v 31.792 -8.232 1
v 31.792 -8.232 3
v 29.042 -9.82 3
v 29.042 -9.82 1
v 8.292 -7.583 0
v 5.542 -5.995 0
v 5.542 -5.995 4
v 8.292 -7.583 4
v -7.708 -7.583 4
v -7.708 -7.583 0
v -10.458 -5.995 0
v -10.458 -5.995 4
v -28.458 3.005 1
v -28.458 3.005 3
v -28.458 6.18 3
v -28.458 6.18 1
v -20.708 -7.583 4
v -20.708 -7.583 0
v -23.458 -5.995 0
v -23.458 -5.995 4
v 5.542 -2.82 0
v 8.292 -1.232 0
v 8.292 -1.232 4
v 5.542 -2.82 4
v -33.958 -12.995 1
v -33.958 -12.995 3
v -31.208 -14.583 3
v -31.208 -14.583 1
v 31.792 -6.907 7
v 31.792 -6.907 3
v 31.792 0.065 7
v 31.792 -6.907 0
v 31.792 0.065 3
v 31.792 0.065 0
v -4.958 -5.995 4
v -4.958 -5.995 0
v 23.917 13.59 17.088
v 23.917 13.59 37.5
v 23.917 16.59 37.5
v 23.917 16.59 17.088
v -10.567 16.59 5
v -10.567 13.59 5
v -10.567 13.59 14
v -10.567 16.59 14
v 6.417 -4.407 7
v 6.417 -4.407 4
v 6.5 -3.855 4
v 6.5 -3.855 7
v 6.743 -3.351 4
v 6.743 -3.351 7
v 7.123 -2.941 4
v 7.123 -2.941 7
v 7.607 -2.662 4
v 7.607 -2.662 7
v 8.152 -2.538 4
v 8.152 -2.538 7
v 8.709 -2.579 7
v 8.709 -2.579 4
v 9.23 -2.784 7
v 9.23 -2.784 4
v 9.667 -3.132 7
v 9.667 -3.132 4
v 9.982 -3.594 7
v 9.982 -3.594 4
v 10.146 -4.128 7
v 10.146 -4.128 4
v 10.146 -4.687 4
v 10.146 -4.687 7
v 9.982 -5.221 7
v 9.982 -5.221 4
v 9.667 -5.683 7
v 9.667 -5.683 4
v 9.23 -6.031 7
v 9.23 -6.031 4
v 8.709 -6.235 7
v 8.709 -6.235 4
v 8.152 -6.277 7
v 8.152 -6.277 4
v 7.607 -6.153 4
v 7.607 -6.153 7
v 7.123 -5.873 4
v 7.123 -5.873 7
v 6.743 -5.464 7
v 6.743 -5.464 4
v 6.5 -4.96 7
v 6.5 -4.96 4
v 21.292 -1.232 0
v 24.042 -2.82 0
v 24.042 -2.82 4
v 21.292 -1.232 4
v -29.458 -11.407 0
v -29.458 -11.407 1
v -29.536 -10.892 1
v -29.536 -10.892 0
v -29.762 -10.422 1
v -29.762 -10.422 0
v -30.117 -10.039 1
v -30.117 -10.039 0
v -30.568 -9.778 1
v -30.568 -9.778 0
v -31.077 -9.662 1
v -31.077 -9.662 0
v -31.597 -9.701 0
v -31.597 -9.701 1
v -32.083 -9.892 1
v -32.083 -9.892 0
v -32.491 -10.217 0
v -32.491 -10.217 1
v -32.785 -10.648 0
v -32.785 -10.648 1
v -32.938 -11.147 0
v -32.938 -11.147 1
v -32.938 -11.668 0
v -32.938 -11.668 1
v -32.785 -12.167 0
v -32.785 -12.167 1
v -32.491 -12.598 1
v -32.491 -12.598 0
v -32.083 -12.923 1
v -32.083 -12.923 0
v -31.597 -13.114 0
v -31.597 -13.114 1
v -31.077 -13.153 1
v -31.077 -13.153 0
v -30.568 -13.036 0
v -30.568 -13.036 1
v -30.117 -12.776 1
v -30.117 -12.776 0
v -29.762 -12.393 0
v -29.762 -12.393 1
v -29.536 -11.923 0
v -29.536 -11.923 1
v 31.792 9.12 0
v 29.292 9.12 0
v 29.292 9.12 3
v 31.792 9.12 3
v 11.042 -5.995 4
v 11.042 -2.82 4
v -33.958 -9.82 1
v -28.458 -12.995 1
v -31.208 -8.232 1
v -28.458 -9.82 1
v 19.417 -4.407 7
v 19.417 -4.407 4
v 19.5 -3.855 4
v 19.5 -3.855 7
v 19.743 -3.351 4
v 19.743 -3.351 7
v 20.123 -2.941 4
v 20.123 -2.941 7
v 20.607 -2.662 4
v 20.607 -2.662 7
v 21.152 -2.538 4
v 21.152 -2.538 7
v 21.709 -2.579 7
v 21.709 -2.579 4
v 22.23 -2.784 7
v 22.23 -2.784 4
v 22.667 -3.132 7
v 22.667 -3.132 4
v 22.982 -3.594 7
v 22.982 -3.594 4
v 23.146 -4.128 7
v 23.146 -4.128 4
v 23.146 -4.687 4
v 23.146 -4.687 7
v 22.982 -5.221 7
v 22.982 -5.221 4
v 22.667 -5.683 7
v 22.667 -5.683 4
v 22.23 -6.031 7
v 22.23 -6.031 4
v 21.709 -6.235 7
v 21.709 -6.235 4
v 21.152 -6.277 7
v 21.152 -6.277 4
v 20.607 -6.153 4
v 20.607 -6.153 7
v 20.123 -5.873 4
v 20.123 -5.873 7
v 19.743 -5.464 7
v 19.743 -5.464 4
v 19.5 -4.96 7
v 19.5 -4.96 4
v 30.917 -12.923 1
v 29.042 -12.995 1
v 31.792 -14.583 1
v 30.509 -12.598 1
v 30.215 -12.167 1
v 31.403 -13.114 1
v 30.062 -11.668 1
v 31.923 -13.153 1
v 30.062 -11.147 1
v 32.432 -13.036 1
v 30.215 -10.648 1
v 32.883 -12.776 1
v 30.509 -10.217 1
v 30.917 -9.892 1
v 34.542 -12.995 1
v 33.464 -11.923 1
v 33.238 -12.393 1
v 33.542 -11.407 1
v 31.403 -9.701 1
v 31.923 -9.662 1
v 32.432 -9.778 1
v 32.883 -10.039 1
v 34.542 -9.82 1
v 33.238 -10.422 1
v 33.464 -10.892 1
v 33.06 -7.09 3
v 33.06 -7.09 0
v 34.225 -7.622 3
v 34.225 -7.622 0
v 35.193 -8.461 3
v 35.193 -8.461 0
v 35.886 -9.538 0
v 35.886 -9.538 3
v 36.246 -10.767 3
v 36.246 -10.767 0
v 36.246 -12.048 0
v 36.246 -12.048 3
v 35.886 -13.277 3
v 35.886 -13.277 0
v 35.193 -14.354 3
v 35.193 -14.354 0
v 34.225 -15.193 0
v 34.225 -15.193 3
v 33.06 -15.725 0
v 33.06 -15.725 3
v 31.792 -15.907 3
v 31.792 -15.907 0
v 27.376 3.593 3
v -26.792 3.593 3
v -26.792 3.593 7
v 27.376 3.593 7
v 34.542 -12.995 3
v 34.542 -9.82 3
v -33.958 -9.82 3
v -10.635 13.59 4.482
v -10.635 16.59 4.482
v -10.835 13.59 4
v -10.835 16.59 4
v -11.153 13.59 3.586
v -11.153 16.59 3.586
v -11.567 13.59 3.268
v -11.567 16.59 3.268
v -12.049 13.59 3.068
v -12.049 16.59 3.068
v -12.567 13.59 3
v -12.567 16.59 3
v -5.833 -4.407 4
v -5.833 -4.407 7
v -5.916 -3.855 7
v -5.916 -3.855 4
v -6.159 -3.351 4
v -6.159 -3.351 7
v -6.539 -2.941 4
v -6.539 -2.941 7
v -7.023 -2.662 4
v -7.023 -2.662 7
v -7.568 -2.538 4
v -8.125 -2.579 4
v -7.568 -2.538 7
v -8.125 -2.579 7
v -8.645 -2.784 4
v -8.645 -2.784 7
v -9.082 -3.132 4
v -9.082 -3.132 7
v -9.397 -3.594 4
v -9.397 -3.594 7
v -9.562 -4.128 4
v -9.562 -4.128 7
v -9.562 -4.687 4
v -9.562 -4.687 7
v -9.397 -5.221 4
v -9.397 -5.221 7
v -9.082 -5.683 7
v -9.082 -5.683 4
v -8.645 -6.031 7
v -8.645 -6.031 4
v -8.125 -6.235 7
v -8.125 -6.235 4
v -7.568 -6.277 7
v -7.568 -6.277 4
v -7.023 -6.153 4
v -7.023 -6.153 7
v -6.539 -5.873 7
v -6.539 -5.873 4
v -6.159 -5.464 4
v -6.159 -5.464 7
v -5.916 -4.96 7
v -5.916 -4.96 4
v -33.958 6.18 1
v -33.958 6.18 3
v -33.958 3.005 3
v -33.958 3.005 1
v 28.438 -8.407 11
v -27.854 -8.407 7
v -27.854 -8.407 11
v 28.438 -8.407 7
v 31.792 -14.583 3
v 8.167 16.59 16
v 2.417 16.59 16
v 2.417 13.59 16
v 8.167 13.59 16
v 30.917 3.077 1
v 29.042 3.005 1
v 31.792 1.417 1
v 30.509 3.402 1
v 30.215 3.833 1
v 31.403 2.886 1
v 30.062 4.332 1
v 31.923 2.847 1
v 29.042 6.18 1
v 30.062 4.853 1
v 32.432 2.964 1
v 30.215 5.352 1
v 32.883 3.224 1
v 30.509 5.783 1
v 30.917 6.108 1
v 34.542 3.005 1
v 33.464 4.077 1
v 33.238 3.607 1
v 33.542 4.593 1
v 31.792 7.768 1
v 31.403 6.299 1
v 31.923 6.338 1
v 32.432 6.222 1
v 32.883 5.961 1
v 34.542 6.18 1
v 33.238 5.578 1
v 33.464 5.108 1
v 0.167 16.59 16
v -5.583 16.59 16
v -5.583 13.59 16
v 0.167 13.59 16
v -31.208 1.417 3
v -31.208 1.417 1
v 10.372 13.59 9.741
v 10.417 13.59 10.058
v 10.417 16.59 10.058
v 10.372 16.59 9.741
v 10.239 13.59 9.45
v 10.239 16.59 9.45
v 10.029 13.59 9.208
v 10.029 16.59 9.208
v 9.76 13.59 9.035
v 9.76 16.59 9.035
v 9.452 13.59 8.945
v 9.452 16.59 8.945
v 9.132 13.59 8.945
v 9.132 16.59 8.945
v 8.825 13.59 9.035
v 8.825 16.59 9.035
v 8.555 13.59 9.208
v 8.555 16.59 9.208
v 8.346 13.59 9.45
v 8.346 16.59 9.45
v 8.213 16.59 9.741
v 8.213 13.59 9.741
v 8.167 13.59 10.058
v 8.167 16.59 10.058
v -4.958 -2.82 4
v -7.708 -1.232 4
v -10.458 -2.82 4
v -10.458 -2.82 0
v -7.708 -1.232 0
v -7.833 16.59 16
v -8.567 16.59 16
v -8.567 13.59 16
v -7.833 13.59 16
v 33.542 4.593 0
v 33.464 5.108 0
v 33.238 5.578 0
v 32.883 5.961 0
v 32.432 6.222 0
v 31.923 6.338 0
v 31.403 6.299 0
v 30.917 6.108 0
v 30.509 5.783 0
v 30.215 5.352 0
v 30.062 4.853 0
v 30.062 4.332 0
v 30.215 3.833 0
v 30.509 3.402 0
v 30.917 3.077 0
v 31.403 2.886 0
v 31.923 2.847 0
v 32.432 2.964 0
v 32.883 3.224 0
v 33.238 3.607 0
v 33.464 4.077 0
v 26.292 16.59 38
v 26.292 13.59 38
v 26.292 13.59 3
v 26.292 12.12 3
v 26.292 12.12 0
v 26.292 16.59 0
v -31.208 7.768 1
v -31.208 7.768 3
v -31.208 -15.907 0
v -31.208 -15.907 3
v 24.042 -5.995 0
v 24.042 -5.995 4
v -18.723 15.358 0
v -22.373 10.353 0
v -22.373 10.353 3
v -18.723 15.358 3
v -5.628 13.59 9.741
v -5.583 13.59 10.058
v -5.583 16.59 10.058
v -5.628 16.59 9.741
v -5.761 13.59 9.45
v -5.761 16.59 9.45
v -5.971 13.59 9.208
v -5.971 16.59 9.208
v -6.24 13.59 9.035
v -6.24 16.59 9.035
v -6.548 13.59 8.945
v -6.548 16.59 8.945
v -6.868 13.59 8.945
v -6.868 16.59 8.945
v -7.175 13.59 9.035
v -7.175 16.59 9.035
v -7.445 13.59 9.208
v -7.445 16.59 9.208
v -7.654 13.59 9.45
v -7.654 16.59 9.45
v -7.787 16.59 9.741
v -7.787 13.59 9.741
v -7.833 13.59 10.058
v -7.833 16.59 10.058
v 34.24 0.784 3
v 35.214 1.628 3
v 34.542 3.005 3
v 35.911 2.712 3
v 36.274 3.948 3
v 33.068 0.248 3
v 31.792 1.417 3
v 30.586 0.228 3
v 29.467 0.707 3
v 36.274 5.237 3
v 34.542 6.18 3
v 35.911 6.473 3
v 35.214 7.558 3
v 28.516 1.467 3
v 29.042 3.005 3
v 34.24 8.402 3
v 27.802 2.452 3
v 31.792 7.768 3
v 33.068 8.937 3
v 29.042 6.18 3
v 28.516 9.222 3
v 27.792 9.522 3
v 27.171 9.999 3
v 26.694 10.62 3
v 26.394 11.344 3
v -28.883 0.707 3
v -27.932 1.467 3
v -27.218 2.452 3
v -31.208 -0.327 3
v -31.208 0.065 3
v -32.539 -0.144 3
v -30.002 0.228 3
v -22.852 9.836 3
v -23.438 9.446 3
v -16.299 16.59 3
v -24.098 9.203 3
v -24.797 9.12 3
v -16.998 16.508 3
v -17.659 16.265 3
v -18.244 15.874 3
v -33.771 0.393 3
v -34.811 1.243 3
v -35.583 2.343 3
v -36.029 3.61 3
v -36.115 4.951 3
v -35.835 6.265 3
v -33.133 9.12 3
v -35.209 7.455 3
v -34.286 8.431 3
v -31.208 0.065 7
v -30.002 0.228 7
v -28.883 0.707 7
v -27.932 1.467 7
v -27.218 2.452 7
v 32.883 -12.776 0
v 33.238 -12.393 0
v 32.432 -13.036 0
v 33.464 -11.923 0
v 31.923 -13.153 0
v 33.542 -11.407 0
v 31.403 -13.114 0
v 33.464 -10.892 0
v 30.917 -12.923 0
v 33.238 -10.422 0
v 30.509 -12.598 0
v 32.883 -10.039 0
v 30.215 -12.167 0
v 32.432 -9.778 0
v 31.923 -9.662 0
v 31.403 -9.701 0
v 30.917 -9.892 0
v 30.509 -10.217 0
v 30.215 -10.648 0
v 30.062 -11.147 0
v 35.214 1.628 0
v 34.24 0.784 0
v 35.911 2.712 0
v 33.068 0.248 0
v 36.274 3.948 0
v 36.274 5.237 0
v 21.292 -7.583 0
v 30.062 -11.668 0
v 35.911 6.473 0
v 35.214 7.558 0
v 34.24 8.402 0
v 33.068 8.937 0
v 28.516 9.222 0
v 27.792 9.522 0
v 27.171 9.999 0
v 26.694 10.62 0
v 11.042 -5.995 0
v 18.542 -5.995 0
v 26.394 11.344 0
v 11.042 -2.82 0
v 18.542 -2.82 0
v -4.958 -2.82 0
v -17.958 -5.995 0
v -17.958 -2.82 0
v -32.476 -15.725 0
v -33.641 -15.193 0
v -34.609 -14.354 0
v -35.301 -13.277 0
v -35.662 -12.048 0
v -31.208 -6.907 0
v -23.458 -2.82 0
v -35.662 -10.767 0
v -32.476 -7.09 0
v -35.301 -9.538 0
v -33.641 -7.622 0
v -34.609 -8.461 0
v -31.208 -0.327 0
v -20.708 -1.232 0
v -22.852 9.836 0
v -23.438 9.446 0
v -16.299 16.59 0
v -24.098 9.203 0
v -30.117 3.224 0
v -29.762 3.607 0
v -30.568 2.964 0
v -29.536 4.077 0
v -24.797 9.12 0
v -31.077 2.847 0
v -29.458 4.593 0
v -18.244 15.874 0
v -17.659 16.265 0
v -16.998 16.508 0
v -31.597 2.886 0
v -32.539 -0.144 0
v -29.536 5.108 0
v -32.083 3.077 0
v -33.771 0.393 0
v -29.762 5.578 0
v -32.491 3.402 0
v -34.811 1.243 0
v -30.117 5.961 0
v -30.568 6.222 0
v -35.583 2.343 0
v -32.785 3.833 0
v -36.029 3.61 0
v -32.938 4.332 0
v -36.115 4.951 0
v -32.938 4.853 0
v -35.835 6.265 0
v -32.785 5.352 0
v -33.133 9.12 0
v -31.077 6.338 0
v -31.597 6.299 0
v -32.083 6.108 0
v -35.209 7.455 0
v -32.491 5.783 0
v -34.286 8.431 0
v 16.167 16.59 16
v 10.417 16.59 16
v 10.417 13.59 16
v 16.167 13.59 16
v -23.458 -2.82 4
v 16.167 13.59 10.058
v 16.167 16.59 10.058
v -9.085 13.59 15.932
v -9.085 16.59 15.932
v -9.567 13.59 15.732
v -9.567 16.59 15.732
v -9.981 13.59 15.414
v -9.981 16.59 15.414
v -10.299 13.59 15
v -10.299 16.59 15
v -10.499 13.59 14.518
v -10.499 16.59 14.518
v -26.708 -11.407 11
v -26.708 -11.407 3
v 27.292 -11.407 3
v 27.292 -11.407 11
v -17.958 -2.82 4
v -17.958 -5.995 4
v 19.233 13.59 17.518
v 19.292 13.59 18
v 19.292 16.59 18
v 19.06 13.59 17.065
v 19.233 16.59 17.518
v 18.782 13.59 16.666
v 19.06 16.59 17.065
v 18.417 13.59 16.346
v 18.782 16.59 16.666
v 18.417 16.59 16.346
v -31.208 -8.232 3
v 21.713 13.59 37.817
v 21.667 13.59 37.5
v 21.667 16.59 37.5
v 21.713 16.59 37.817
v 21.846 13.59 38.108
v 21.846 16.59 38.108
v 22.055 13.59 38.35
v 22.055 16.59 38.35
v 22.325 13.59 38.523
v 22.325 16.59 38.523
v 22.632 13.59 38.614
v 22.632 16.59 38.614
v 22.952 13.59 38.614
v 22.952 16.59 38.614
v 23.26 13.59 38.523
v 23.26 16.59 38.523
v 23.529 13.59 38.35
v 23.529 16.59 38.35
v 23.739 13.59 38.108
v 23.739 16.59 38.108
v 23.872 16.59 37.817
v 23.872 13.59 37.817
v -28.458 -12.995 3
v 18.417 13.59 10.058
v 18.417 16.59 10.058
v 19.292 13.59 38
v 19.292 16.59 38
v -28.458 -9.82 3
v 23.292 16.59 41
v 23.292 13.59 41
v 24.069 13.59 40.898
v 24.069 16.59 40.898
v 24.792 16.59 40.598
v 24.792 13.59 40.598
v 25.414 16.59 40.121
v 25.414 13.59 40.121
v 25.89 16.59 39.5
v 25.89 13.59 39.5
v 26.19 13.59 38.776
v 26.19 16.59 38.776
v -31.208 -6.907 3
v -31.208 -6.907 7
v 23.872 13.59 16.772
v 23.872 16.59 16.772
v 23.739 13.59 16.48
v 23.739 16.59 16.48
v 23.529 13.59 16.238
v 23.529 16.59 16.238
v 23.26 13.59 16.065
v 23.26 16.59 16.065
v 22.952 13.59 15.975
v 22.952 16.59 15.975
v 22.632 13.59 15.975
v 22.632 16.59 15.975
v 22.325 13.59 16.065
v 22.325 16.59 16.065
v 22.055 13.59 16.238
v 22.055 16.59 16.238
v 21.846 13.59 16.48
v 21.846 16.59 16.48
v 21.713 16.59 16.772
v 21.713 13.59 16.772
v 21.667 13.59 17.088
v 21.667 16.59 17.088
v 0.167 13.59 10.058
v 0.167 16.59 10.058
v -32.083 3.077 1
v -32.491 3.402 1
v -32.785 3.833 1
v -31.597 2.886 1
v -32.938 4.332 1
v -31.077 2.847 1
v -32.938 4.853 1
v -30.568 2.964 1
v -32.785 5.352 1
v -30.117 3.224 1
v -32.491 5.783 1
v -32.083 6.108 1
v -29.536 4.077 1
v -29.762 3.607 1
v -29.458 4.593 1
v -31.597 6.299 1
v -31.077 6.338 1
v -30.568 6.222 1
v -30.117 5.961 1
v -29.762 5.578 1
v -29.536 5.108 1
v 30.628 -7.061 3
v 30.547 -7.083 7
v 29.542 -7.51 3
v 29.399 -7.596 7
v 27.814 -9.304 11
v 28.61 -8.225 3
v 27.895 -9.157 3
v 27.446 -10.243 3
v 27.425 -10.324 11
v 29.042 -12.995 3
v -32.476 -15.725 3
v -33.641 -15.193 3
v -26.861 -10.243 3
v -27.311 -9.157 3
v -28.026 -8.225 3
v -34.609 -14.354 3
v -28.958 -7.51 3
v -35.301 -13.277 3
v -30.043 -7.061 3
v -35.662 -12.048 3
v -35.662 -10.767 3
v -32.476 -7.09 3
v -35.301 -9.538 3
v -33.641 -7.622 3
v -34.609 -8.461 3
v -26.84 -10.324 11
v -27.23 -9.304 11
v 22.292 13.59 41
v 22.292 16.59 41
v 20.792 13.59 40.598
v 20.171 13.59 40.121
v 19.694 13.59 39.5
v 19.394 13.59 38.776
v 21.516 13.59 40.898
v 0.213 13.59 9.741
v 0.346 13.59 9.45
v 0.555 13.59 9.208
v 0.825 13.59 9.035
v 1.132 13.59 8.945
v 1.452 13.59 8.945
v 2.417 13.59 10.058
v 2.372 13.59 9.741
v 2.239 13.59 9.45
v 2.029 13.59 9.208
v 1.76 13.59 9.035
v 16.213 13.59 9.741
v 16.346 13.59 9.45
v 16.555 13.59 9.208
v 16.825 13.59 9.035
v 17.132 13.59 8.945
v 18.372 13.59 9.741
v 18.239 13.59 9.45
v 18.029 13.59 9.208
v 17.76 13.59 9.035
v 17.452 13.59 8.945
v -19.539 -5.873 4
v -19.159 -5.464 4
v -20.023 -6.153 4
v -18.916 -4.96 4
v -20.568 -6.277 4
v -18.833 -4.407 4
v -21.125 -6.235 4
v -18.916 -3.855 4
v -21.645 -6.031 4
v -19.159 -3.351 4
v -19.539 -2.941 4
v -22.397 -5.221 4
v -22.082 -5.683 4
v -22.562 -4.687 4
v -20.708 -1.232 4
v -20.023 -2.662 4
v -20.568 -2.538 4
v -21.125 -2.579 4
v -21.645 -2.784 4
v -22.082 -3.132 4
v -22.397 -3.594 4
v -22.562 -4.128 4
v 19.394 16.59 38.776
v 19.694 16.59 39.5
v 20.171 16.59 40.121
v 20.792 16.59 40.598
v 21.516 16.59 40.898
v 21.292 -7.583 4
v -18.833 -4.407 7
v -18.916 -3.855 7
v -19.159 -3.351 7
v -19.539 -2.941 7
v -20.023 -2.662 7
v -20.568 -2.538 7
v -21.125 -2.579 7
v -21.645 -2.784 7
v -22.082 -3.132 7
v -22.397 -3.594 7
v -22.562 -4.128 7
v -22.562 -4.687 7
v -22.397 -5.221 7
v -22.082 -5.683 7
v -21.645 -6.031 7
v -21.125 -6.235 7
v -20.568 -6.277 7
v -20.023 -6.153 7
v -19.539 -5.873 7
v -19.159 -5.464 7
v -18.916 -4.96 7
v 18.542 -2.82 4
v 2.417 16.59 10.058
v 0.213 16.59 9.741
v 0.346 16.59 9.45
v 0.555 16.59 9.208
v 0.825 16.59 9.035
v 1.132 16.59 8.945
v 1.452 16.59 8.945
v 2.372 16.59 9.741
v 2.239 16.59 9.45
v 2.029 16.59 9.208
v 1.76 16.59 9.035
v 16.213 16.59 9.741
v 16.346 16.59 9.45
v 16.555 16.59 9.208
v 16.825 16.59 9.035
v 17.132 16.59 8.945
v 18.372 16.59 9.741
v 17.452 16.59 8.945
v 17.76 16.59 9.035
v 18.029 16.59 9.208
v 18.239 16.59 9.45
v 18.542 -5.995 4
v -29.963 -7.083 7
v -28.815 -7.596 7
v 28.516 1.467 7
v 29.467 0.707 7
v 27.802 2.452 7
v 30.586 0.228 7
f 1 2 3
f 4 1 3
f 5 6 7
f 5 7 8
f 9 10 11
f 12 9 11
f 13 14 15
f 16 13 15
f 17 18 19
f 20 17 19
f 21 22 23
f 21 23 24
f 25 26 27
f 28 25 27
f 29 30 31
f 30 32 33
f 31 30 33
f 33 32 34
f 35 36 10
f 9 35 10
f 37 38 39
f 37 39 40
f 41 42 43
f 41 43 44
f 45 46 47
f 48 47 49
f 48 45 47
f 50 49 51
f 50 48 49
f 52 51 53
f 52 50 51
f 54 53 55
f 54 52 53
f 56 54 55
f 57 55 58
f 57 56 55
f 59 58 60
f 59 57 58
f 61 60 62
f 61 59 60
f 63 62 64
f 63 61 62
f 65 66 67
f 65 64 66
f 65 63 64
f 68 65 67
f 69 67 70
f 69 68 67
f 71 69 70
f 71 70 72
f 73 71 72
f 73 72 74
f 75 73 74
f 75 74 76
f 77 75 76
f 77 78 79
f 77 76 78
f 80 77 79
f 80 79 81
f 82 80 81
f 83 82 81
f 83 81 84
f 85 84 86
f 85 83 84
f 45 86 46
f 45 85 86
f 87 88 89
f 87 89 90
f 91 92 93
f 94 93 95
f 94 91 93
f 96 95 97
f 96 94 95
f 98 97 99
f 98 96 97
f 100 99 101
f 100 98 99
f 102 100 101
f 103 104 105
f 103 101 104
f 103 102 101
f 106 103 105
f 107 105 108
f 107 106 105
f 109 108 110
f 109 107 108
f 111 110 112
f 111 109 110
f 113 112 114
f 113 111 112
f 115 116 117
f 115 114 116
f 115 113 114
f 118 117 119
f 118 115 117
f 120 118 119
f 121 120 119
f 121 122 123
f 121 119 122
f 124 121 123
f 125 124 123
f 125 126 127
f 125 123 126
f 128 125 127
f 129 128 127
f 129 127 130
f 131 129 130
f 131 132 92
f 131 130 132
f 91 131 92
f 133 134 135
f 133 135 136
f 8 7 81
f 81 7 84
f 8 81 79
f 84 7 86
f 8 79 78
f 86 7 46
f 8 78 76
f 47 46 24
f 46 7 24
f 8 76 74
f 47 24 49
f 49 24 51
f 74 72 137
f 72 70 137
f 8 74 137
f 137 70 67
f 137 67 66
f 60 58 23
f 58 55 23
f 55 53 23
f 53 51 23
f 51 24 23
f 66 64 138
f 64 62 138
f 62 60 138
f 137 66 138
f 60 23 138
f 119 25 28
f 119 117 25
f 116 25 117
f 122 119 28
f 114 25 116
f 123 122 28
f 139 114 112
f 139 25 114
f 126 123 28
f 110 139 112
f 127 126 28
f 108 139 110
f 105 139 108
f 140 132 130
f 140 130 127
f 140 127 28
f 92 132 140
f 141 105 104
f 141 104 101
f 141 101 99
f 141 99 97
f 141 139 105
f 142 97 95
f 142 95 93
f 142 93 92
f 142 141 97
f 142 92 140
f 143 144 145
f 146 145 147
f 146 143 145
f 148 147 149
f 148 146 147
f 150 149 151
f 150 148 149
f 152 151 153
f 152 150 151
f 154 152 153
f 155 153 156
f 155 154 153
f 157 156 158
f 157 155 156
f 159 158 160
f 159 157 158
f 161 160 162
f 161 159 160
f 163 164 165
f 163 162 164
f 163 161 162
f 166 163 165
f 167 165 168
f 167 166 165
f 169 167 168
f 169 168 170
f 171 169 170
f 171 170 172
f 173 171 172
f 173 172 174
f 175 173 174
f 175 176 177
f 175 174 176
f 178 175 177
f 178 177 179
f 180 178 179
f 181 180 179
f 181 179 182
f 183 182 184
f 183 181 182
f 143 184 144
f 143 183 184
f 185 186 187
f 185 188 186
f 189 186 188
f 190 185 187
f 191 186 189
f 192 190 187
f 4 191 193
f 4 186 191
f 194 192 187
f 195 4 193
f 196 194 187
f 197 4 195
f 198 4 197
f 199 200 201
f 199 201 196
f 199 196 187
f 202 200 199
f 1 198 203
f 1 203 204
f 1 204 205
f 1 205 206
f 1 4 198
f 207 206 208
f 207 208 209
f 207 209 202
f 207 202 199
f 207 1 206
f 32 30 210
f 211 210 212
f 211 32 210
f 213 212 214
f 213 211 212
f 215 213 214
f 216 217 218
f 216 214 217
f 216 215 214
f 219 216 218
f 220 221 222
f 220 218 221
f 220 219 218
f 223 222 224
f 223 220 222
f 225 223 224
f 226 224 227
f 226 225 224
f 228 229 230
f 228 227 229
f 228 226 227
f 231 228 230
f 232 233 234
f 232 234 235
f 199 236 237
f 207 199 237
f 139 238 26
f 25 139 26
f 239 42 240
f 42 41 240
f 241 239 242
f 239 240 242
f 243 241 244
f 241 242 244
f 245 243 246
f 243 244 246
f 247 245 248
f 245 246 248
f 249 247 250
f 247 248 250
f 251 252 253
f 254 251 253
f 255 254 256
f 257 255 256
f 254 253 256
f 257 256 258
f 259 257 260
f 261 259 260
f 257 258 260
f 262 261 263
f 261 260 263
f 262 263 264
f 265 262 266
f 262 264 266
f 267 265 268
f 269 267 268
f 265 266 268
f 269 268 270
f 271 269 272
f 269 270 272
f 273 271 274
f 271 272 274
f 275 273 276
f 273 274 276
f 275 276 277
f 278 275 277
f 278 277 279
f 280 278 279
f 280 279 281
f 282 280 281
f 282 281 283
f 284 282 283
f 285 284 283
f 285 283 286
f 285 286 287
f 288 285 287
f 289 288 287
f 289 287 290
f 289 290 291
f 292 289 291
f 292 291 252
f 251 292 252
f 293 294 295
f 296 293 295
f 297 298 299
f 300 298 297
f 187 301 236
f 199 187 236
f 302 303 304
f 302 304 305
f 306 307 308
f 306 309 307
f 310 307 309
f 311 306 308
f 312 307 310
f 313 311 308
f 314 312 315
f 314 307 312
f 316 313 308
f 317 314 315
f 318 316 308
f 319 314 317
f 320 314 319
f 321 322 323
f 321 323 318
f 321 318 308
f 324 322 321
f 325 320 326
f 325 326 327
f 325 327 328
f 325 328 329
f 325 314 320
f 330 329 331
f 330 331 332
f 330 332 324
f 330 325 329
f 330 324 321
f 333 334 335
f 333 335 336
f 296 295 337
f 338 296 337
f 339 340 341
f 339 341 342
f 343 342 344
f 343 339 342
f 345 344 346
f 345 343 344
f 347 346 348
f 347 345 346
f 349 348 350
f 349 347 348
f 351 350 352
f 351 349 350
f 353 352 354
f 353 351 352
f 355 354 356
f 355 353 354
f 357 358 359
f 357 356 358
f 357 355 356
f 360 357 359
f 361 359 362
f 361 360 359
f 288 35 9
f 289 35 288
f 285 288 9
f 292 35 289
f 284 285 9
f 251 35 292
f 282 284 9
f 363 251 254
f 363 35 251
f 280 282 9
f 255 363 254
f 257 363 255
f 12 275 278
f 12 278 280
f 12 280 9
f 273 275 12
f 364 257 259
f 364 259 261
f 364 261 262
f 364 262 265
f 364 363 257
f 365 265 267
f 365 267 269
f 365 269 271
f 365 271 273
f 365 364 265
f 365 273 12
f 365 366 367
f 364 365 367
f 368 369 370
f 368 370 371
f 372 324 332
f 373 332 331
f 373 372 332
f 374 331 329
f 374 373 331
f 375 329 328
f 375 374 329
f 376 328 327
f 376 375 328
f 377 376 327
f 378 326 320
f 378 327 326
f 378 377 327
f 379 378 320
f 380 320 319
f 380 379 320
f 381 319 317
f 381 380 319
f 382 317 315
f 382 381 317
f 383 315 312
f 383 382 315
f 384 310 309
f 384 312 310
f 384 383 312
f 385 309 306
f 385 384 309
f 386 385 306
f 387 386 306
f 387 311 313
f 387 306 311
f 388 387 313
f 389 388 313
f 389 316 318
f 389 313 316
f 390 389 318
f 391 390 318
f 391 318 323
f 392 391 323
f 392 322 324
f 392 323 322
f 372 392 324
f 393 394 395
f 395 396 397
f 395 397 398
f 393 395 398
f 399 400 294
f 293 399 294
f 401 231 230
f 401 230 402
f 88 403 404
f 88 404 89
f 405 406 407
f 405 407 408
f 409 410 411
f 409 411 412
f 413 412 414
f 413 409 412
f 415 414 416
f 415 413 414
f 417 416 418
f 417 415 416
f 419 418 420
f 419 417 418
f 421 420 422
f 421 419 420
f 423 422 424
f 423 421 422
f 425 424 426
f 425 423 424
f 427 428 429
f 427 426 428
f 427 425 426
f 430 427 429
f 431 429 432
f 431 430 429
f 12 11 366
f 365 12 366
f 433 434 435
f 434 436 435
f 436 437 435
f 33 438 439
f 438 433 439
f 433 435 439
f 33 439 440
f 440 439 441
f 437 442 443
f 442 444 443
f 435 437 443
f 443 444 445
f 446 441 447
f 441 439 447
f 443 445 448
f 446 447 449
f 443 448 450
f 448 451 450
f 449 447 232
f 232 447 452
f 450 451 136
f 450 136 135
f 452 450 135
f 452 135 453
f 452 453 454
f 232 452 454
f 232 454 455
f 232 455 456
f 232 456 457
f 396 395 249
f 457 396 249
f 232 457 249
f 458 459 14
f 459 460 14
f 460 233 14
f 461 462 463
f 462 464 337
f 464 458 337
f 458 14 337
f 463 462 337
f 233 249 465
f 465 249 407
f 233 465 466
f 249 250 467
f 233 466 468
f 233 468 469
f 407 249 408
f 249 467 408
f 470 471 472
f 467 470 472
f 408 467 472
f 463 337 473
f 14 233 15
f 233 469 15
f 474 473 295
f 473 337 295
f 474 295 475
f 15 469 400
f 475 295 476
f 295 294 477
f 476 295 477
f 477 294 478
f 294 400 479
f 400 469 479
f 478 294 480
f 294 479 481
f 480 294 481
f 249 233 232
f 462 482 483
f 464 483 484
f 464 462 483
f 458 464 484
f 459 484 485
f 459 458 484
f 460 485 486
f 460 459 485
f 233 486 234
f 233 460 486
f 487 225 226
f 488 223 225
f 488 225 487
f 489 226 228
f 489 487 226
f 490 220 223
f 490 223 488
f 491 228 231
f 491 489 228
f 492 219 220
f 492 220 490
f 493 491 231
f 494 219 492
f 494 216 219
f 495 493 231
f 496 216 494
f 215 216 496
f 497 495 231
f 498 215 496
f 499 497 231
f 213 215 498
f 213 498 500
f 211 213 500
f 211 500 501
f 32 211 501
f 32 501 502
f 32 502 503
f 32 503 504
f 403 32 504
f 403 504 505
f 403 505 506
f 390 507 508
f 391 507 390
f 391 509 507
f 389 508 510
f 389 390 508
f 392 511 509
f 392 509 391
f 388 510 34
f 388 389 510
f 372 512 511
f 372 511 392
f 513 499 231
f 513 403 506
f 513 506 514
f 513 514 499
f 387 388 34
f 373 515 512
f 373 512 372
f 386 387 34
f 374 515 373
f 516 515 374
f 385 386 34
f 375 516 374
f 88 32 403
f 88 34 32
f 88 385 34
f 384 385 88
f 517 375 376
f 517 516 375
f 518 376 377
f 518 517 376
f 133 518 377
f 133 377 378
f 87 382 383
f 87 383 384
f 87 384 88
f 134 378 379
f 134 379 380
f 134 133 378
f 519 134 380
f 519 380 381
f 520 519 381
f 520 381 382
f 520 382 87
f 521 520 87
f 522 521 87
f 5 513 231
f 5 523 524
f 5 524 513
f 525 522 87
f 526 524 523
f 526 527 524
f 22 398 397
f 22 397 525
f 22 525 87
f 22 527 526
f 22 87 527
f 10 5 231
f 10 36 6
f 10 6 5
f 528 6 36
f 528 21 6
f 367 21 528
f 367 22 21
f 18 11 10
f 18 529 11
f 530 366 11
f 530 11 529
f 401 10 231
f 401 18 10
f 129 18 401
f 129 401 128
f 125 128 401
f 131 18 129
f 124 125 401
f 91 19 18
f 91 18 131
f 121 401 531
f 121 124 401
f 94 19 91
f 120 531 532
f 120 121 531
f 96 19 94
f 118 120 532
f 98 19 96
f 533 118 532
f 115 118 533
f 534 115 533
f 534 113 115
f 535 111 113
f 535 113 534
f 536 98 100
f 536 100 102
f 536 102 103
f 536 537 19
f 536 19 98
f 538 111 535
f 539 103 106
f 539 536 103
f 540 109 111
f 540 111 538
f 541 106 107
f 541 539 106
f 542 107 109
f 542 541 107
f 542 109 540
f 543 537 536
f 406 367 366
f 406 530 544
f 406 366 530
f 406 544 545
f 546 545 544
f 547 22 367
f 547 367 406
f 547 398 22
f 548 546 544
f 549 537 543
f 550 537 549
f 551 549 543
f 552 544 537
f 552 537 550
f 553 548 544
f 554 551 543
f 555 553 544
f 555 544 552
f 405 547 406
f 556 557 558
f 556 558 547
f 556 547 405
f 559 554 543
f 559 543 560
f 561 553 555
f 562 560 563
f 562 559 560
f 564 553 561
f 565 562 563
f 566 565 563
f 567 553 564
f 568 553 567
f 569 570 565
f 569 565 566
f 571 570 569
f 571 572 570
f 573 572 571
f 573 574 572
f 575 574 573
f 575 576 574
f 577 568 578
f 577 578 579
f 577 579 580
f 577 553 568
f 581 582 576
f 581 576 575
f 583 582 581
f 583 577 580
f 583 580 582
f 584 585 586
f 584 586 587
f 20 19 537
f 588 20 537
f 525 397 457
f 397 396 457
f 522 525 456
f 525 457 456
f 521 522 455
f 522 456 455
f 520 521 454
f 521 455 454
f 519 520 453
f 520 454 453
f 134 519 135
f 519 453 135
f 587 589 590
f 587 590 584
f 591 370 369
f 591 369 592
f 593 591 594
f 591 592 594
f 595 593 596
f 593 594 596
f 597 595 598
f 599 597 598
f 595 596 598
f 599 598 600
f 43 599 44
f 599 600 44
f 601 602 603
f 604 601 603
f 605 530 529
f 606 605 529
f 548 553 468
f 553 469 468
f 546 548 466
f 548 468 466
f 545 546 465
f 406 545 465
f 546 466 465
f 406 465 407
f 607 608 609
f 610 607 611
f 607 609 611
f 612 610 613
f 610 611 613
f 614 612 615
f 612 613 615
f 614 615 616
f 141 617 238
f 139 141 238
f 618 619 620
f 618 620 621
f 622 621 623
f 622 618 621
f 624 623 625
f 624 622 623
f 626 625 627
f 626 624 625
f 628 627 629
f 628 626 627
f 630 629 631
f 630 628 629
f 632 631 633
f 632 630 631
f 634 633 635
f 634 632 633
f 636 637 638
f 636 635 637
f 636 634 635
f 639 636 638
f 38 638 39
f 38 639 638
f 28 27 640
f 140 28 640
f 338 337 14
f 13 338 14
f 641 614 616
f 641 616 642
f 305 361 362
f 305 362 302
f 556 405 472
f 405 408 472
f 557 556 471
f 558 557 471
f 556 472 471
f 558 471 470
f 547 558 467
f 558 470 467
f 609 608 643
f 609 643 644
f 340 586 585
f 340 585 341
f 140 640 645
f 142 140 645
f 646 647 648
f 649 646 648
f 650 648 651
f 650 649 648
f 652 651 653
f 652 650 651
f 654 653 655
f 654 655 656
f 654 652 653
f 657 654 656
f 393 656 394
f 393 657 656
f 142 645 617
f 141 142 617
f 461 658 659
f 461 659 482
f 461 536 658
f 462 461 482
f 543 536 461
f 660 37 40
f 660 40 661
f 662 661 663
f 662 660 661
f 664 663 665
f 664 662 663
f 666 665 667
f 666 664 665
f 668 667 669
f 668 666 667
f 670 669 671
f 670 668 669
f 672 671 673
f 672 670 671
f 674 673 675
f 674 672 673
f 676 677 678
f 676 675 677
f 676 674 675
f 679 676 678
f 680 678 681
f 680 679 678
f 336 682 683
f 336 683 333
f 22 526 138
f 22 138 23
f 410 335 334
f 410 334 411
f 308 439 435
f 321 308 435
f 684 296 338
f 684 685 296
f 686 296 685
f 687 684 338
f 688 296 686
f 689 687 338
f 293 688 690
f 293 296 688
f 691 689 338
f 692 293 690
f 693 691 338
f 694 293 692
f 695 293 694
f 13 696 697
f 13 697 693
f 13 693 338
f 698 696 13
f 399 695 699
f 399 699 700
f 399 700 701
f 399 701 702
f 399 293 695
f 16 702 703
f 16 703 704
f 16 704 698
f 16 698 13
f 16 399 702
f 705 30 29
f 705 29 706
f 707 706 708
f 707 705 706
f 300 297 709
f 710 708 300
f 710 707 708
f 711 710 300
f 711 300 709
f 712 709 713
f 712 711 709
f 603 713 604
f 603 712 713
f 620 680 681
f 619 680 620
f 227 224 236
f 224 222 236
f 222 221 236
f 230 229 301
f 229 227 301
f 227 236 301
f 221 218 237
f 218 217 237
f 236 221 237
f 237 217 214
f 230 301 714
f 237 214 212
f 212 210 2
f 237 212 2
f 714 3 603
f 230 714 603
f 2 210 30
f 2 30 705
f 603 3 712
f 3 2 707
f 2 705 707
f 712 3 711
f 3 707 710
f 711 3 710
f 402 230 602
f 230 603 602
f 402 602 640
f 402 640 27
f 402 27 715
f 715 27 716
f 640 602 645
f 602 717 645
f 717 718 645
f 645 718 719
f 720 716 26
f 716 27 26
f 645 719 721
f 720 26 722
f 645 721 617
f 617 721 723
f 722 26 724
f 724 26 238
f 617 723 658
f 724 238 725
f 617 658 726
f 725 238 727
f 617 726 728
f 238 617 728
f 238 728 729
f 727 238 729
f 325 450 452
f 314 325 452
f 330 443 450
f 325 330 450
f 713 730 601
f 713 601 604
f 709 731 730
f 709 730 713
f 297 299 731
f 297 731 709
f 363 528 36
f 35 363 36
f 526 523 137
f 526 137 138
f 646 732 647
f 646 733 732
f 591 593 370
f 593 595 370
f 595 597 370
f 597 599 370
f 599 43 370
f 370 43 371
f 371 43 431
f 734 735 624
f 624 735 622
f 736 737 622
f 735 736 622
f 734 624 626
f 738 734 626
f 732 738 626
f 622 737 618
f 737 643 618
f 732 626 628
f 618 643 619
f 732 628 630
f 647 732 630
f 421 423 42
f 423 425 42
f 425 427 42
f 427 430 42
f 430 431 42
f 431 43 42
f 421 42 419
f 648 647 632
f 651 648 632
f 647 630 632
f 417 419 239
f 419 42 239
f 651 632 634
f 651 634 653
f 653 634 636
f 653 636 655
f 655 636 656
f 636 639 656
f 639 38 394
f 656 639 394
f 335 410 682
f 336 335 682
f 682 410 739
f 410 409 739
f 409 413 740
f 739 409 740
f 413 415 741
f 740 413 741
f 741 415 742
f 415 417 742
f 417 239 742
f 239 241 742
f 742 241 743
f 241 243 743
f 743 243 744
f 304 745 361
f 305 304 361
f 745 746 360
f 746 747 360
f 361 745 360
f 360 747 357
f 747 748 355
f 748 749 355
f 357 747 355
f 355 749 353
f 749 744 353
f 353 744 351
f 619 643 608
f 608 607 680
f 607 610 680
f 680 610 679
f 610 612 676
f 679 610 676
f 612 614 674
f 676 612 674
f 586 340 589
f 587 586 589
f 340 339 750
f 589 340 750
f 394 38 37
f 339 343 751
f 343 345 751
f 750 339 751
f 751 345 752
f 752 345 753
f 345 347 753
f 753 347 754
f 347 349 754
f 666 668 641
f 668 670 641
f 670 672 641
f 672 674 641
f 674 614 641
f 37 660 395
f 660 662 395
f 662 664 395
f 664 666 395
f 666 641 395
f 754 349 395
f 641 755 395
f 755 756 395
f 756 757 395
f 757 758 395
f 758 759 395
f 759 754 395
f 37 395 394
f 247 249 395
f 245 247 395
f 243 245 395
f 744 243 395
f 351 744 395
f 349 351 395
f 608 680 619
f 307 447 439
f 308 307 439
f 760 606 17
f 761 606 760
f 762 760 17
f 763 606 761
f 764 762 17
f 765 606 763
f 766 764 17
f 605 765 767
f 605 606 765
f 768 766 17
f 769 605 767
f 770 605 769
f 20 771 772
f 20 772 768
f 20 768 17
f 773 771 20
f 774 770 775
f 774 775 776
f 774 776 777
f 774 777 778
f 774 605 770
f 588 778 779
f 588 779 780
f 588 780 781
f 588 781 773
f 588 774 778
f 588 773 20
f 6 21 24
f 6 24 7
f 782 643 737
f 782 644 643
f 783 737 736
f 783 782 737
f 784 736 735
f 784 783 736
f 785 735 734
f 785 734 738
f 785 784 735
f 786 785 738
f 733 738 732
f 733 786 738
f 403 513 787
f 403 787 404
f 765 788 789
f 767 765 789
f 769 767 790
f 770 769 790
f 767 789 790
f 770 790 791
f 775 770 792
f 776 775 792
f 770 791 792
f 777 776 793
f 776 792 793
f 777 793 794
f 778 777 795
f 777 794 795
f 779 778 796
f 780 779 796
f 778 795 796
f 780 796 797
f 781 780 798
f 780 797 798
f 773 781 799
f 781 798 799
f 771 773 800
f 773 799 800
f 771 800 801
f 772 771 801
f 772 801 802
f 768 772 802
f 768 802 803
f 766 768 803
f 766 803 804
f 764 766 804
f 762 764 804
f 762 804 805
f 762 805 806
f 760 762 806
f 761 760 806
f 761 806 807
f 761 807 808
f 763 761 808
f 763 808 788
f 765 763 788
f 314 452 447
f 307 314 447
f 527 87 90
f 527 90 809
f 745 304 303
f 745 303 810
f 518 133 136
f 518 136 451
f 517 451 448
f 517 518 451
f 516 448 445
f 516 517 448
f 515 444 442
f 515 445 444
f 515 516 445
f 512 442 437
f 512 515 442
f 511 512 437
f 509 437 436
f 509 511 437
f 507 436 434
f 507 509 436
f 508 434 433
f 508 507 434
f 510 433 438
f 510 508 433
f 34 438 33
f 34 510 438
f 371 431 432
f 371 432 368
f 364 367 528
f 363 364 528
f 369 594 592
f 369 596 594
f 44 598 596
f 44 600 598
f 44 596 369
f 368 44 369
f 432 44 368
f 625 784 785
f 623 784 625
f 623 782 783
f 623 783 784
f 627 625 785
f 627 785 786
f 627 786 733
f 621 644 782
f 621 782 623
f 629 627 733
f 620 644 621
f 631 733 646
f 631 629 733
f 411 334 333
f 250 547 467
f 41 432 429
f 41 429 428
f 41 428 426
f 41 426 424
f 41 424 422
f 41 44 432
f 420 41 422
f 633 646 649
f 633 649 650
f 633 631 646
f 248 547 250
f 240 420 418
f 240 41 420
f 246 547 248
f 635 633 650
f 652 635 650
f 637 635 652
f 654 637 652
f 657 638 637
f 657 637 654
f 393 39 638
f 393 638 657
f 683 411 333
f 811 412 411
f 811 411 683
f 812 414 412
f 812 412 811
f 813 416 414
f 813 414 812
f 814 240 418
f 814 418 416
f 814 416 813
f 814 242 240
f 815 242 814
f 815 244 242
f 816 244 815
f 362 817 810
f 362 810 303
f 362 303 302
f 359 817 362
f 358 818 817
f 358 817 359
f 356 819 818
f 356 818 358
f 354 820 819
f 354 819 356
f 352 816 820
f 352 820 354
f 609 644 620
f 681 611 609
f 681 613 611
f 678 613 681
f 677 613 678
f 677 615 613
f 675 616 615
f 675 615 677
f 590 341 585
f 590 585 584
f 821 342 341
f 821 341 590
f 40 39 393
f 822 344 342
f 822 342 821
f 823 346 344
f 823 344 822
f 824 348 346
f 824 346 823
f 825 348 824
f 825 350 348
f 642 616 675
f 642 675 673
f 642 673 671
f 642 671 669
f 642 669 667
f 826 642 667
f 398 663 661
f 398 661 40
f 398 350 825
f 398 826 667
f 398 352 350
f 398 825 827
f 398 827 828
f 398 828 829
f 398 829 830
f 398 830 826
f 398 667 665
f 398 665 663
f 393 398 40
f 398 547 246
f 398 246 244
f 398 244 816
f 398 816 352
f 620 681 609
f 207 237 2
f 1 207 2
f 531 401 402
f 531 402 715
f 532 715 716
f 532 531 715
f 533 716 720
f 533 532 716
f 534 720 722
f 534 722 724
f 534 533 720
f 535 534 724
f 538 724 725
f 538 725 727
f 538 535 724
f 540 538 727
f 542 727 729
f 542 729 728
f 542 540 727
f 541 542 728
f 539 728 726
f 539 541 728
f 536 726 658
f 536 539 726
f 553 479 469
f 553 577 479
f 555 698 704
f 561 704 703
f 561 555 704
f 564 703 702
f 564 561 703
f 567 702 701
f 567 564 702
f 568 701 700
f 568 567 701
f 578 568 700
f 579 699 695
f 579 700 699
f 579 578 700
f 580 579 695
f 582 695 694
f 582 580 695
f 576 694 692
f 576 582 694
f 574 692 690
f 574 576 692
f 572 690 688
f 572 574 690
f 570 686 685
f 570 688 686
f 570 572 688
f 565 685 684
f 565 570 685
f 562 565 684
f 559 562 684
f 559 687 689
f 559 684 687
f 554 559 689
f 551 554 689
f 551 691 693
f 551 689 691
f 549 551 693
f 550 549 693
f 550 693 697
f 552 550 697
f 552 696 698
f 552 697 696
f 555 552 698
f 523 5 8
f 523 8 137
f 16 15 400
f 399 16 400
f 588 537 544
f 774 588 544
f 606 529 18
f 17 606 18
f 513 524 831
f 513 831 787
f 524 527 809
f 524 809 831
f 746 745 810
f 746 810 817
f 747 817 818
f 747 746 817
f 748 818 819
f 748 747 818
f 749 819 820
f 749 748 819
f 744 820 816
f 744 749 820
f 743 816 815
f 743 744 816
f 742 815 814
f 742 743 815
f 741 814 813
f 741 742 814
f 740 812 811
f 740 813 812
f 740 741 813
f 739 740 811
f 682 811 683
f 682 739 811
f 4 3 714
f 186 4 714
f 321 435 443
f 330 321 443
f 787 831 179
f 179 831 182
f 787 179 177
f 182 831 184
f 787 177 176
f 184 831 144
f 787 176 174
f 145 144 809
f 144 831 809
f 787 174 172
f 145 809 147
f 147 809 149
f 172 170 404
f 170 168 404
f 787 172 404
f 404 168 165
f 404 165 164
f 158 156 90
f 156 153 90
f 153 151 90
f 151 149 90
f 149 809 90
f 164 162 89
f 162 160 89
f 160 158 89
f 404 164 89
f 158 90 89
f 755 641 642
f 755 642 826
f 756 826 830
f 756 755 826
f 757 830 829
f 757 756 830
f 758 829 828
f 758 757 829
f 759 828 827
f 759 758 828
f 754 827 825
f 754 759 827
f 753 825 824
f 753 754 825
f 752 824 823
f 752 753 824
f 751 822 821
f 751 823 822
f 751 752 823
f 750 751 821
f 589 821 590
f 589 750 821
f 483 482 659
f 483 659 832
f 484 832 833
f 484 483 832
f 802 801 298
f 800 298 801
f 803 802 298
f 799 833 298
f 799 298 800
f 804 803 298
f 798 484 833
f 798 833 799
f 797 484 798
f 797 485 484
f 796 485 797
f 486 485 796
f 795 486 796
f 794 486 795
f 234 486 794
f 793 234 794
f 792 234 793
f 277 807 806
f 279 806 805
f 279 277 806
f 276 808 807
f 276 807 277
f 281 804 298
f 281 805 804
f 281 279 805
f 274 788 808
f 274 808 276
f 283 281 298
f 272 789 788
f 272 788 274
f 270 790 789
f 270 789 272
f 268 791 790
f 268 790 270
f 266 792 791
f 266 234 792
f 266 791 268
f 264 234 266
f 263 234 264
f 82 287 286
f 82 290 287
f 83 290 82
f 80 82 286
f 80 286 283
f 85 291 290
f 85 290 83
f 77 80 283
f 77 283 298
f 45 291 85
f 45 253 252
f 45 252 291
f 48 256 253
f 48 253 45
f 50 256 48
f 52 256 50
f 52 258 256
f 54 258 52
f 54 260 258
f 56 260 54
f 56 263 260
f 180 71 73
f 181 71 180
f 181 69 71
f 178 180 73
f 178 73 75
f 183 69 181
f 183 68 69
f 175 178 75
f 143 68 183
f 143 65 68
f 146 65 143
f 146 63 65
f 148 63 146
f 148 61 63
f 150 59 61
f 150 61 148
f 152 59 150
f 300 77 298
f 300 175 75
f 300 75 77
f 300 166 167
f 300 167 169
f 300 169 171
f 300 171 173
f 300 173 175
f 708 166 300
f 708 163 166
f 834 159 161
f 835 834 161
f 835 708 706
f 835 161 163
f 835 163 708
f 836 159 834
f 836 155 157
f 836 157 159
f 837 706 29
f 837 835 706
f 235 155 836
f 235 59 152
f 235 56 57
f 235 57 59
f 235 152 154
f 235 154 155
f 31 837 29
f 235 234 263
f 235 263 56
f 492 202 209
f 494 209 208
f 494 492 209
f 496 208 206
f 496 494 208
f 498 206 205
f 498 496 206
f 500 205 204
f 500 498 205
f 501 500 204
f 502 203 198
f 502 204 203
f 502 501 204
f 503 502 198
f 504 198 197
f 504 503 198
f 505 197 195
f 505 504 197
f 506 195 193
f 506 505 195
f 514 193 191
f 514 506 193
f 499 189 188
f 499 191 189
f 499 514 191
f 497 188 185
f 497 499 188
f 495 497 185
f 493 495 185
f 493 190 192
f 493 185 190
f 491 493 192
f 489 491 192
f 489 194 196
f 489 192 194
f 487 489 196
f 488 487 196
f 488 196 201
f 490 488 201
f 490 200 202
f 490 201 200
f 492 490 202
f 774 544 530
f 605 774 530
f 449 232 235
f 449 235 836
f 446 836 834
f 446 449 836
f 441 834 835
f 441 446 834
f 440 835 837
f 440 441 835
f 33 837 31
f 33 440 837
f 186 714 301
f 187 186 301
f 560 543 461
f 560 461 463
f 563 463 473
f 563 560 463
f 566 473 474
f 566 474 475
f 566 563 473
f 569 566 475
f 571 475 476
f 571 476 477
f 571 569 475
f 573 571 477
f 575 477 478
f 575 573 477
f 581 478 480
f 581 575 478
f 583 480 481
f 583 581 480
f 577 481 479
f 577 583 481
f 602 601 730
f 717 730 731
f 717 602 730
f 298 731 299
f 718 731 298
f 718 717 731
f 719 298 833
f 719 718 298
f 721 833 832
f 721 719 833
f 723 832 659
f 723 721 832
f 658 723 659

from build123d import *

# Parameters (mm, degrees)
ESQUISSE1_R             = 1.749999998
BOSS_EXTRU_1_DEPTH      = 3
ENL_V_MAT_EXTRU_1_DEPTH = 2
ESQUISSE3_W             = 63
ESQUISSE3_H             = 15
BOSS_EXTRU_2_DEPTH      = 4
ESQUISSE5_W             = 63
ESQUISSE5_H             = 3
BOSS_EXTRU_3_DEPTH      = 4
ESQUISSE4_R             = 4.499999998
ESQUISSE4_R_2           = 4.527692567
ENL_V_MAT_EXTRU_2_DEPTH = 41.723100164
ESQUISSE6_R             = 1.875
ENL_V_MAT_EXTRU_4_DEPTH = 41.538511158
ENL_V_MAT_EXTRU_5_DEPTH = 4
ESQUISSE8_W             = 36.859122618
ESQUISSE8_H             = 3
BOSS_EXTRU_4_DEPTH      = 13
CONG_1_R                = 3
ESQUISSE9_W             = 7
ESQUISSE9_H             = 3
BOSS_EXTRU_5_DEPTH      = 25
CONG_2_R                = 3
CONG_3_R                = 2
CONG_4_R                = 2
ENL_V_MAT_EXTRU_6_DEPTH = 63.211313789


with BuildPart() as part:
    # Esquisse1 → Boss.-Extru.1 (new body)
    with BuildSketch(Plane.XY):
        with BuildLine():
            Line((-33.132757167, 9.120273973), (-23.272060479, 9.120273973))
            Line((-23.272060479, 9.120273973), (-17.824378499, 16.590273973))
            Line((-17.824378499, 16.590273973), (26.292187613, 16.590273973))
            Line((26.292187613, 16.590273973), (26.292187613, 9.120273973))
            Line((26.292187613, 9.120273973), (31.792187613, 9.120273973))
            ThreePointArc((31.792187613, 9.120273973), (36.319880182, 4.592581404), (31.792187613, 0.064888835))
            Line((31.792187613, 0.064888835), (31.792187613, -6.907418596))
            ThreePointArc((31.792187613, -6.907418596), (36.292187613, -11.407418596), (31.792187613, -15.907418596))
            Line((31.792187613, -15.907418596), (-31.207812389, -15.907418596))
            ThreePointArc((-31.207812389, -15.907418596), (-35.707812387, -11.407418595), (-31.207812387, -6.907418596))
            Line((-31.207812387, -6.907418596), (-31.207812387, -0.327318229))
            ThreePointArc((-31.207812387, -0.327318229), (-36.028663215, 3.610334136), (-33.132757167, 9.120273973))
        make_face()
        with Locations((-31.207812387, 4.592581404)):
            Circle(ESQUISSE1_R, mode=Mode.SUBTRACT)
        with Locations((-31.207812387, -11.407418596)):
            Circle(ESQUISSE1_R, mode=Mode.SUBTRACT)
        with Locations((31.792187613, 4.592581404)):
            Circle(ESQUISSE1_R, mode=Mode.SUBTRACT)
        with Locations((31.792187613, -11.407418596)):
            Circle(ESQUISSE1_R, mode=Mode.SUBTRACT)
    extrude(amount=BOSS_EXTRU_1_DEPTH)

    # Esquisse2 → Enlèv. mat.-Extru.1 (cut)
    with BuildSketch(Plane.XY.offset(3)):
        Polygon((-28.457812387, 6.180294644), (-31.207812387, 7.768007885), (-33.957812387, 6.180294644), (-33.957812387, 3.004868164), (-31.207812387, 1.417154924), (-28.457812387, 3.004868164), align=None)
        Polygon((-28.457812387, -9.819705356), (-31.207812387, -8.231992115), (-33.957812387, -9.819705356), (-33.957812387, -12.995131836), (-31.207812387, -14.582845076), (-28.457812387, -12.995131836), align=None)
        Polygon((29.042187613, -9.819705356), (29.042187613, -12.995131836), (31.792187613, -14.582845076), (34.542187613, -12.995131836), (34.542187613, -9.819705356), (31.792187613, -8.231992115), align=None)
        Polygon((29.042187613, 3.004868164), (31.792187613, 1.417154924), (34.542187613, 3.004868164), (34.542187613, 6.180294644), (31.792187613, 7.768007885), (29.042187613, 6.180294644), align=None)
    extrude(amount=-ENL_V_MAT_EXTRU_1_DEPTH, mode=Mode.SUBTRACT)

    # Esquisse3 → Boss.-Extru.2 (add)
    with BuildSketch(Plane.XY.offset(3)):
        with Locations((0.292187613, -3.907418596)):
            Rectangle(ESQUISSE3_W, ESQUISSE3_H)
    extrude(amount=BOSS_EXTRU_2_DEPTH)

    # Esquisse5 → Boss.-Extru.3 (add)
    with BuildSketch(Plane.XY.offset(7)):
        with Locations((0.292187613, -9.907418596)):
            Rectangle(ESQUISSE5_W, ESQUISSE5_H)
    extrude(amount=BOSS_EXTRU_3_DEPTH)

    # Esquisse4 → Enlèv. mat.-Extru.2 (cut, through all)
    with BuildSketch(Plane.XY.offset(3)):
        with Locations((-31.207812387, -11.407418596)):
            Circle(ESQUISSE4_R)
        with Locations((31.792187613, -11.407418596)):
            Circle(ESQUISSE4_R)
        with Locations((-31.207812387, 4.592581404)):
            Circle(ESQUISSE4_R_2)
        with Locations((31.792187613, 4.592581404)):
            Circle(ESQUISSE4_R_2)
    extrude(amount=ENL_V_MAT_EXTRU_2_DEPTH, mode=Mode.SUBTRACT)

    # Esquisse6 → Enlèv. mat.-Extru.4 (cut, through all)
    with BuildSketch(Plane.XY.offset(7)):
        with Locations((-20.707812387, -4.407418596)):
            Circle(ESQUISSE6_R)
        with Locations((-7.707812387, -4.407418596)):
            Circle(ESQUISSE6_R)
    enl_v_mat_extru_4 = extrude(amount=-ENL_V_MAT_EXTRU_4_DEPTH, mode=Mode.SUBTRACT)

    # Esquisse7 → Enlèv. mat.-Extru.5 (cut)
    with BuildSketch(Plane(origin=(0, 0, 0), x_dir=(-1, 0, 0), z_dir=(0, 0, -1))):
        Polygon((23.457812387, -2.819705356), (20.707812387, -1.231992115), (17.957812387, -2.819705356), (17.957812387, -5.995131836), (20.707812387, -7.582845076), (23.457812387, -5.995131836), align=None)
        Polygon((10.457812387, -2.819705356), (7.707812387, -1.231992115), (4.957812387, -2.819705356), (4.957812387, -5.995131836), (7.707812387, -7.582845076), (10.457812387, -5.995131836), align=None)
    enl_v_mat_extru_5 = extrude(amount=-ENL_V_MAT_EXTRU_5_DEPTH, mode=Mode.SUBTRACT)

    # Symétrie1: Enlèv. mat.-Extru.4, Enlèv. mat.-Extru.5 across plane
    add(enl_v_mat_extru_4.mirror(Plane(origin=(0.292187613, 0, 0), x_dir=(0, 0, 1), z_dir=(1, 0, 0))), mode=Mode.SUBTRACT)
    add(enl_v_mat_extru_5.mirror(Plane(origin=(0.292187613, 0, 0), x_dir=(0, 0, 1), z_dir=(1, 0, 0))), mode=Mode.SUBTRACT)

    # Esquisse8 → Boss.-Extru.4 (add)
    with BuildSketch(Plane.XY.offset(3)):
        with Locations((7.862626304, 15.090273973)):
            Rectangle(ESQUISSE8_W, ESQUISSE8_H)
    extrude(amount=BOSS_EXTRU_4_DEPTH)

    # Congé1
    cong_1_edges = [part.edges().sort_by_distance(p)[0] for p in [
        (-23.272060479, 9.120273973, 1.5),
        (-17.824378499, 16.590273973, 1.5),
        (26.292187613, 9.120273973, 1.5),
    ]]
    fillet(cong_1_edges, radius=CONG_1_R)

    # Esquisse9 → Boss.-Extru.5 (add)
    with BuildSketch(Plane.XY.offset(16)):
        with Locations((22.792187613, 15.090273973)):
            Rectangle(ESQUISSE9_W, ESQUISSE9_H)
    extrude(amount=BOSS_EXTRU_5_DEPTH)

    # Congé2
    cong_2_edges = [part.edges().sort_by_distance(p)[0] for p in [
        (19.292187613, 15.090273973, 41),
        (26.292187613, 15.090273973, 41),
    ]]
    fillet(cong_2_edges, radius=CONG_2_R)

    # Congé3
    cong_3_edges = [part.edges().sort_by_distance(p)[0] for p in [
        (19.292187613, 15.090273973, 16),
    ]]
    fillet(cong_3_edges, radius=CONG_3_R)

    # Congé4
    cong_4_edges = [part.edges().sort_by_distance(p)[0] for p in [
        (-10.566935005, 15.090273973, 3),
        (-10.566935005, 15.090273973, 16),
    ]]
    fillet(cong_4_edges, radius=CONG_4_R)

    # Esquisse10 → Enlèv. mat.-Extru.6 (cut, through all)
    with BuildSketch(Plane.XZ.offset(-13.590273973)):
        with BuildLine():
            Line((23.917187613, 37.5), (23.917187613, 17.088453941))
            ThreePointArc((23.917187613, 17.088453941), (22.792187613, 15.963453941), (21.667187613, 17.088453941))
            Line((21.667187613, 17.088453941), (21.667187613, 37.5))
            ThreePointArc((21.667187613, 37.5), (22.792187613, 38.625), (23.917187613, 37.5))
        make_face()
        with BuildLine():
            Line((18.417187613, 23.212933961), (18.417187613, 10.058154515))
            ThreePointArc((18.417187613, 10.058154515), (17.292187613, 8.933154515), (16.167187613, 10.058154515))
            Line((16.167187613, 10.058154515), (16.167187613, 23.212933961))
            ThreePointArc((16.167187613, 23.212933961), (17.292187613, 24.337933961), (18.417187613, 23.212933961))
        make_face()
        with BuildLine():
            Line((10.417187613, 23.212933961), (10.417187613, 10.058154515))
            ThreePointArc((10.417187613, 10.058154515), (9.292187613, 8.933154515), (8.167187613, 10.058154515))
            Line((8.167187613, 10.058154515), (8.167187613, 23.212933961))
            ThreePointArc((8.167187613, 23.212933961), (9.292187613, 24.337933961), (10.417187613, 23.212933961))
        make_face()
        with BuildLine():
            Line((2.417187613, 23.212933961), (2.417187613, 10.058154515))
            ThreePointArc((2.417187613, 10.058154515), (1.292187613, 8.933154515), (0.167187613, 10.058154515))
            Line((0.167187613, 10.058154515), (0.167187613, 23.212933961))
            ThreePointArc((0.167187613, 23.212933961), (1.292187613, 24.337933961), (2.417187613, 23.212933961))
        make_face()
        with BuildLine():
            Line((-5.582812387, 23.212933961), (-5.582812387, 10.058154515))
            ThreePointArc((-5.582812387, 10.058154515), (-6.707812387, 8.933154515), (-7.832812387, 10.058154515))
            Line((-7.832812387, 10.058154515), (-7.832812387, 23.212933961))
            ThreePointArc((-7.832812387, 23.212933961), (-6.707812387, 24.337933961), (-5.582812387, 23.212933961))
        make_face()
    extrude(amount=-ENL_V_MAT_EXTRU_6_DEPTH, mode=Mode.SUBTRACT)


solid = part.part
